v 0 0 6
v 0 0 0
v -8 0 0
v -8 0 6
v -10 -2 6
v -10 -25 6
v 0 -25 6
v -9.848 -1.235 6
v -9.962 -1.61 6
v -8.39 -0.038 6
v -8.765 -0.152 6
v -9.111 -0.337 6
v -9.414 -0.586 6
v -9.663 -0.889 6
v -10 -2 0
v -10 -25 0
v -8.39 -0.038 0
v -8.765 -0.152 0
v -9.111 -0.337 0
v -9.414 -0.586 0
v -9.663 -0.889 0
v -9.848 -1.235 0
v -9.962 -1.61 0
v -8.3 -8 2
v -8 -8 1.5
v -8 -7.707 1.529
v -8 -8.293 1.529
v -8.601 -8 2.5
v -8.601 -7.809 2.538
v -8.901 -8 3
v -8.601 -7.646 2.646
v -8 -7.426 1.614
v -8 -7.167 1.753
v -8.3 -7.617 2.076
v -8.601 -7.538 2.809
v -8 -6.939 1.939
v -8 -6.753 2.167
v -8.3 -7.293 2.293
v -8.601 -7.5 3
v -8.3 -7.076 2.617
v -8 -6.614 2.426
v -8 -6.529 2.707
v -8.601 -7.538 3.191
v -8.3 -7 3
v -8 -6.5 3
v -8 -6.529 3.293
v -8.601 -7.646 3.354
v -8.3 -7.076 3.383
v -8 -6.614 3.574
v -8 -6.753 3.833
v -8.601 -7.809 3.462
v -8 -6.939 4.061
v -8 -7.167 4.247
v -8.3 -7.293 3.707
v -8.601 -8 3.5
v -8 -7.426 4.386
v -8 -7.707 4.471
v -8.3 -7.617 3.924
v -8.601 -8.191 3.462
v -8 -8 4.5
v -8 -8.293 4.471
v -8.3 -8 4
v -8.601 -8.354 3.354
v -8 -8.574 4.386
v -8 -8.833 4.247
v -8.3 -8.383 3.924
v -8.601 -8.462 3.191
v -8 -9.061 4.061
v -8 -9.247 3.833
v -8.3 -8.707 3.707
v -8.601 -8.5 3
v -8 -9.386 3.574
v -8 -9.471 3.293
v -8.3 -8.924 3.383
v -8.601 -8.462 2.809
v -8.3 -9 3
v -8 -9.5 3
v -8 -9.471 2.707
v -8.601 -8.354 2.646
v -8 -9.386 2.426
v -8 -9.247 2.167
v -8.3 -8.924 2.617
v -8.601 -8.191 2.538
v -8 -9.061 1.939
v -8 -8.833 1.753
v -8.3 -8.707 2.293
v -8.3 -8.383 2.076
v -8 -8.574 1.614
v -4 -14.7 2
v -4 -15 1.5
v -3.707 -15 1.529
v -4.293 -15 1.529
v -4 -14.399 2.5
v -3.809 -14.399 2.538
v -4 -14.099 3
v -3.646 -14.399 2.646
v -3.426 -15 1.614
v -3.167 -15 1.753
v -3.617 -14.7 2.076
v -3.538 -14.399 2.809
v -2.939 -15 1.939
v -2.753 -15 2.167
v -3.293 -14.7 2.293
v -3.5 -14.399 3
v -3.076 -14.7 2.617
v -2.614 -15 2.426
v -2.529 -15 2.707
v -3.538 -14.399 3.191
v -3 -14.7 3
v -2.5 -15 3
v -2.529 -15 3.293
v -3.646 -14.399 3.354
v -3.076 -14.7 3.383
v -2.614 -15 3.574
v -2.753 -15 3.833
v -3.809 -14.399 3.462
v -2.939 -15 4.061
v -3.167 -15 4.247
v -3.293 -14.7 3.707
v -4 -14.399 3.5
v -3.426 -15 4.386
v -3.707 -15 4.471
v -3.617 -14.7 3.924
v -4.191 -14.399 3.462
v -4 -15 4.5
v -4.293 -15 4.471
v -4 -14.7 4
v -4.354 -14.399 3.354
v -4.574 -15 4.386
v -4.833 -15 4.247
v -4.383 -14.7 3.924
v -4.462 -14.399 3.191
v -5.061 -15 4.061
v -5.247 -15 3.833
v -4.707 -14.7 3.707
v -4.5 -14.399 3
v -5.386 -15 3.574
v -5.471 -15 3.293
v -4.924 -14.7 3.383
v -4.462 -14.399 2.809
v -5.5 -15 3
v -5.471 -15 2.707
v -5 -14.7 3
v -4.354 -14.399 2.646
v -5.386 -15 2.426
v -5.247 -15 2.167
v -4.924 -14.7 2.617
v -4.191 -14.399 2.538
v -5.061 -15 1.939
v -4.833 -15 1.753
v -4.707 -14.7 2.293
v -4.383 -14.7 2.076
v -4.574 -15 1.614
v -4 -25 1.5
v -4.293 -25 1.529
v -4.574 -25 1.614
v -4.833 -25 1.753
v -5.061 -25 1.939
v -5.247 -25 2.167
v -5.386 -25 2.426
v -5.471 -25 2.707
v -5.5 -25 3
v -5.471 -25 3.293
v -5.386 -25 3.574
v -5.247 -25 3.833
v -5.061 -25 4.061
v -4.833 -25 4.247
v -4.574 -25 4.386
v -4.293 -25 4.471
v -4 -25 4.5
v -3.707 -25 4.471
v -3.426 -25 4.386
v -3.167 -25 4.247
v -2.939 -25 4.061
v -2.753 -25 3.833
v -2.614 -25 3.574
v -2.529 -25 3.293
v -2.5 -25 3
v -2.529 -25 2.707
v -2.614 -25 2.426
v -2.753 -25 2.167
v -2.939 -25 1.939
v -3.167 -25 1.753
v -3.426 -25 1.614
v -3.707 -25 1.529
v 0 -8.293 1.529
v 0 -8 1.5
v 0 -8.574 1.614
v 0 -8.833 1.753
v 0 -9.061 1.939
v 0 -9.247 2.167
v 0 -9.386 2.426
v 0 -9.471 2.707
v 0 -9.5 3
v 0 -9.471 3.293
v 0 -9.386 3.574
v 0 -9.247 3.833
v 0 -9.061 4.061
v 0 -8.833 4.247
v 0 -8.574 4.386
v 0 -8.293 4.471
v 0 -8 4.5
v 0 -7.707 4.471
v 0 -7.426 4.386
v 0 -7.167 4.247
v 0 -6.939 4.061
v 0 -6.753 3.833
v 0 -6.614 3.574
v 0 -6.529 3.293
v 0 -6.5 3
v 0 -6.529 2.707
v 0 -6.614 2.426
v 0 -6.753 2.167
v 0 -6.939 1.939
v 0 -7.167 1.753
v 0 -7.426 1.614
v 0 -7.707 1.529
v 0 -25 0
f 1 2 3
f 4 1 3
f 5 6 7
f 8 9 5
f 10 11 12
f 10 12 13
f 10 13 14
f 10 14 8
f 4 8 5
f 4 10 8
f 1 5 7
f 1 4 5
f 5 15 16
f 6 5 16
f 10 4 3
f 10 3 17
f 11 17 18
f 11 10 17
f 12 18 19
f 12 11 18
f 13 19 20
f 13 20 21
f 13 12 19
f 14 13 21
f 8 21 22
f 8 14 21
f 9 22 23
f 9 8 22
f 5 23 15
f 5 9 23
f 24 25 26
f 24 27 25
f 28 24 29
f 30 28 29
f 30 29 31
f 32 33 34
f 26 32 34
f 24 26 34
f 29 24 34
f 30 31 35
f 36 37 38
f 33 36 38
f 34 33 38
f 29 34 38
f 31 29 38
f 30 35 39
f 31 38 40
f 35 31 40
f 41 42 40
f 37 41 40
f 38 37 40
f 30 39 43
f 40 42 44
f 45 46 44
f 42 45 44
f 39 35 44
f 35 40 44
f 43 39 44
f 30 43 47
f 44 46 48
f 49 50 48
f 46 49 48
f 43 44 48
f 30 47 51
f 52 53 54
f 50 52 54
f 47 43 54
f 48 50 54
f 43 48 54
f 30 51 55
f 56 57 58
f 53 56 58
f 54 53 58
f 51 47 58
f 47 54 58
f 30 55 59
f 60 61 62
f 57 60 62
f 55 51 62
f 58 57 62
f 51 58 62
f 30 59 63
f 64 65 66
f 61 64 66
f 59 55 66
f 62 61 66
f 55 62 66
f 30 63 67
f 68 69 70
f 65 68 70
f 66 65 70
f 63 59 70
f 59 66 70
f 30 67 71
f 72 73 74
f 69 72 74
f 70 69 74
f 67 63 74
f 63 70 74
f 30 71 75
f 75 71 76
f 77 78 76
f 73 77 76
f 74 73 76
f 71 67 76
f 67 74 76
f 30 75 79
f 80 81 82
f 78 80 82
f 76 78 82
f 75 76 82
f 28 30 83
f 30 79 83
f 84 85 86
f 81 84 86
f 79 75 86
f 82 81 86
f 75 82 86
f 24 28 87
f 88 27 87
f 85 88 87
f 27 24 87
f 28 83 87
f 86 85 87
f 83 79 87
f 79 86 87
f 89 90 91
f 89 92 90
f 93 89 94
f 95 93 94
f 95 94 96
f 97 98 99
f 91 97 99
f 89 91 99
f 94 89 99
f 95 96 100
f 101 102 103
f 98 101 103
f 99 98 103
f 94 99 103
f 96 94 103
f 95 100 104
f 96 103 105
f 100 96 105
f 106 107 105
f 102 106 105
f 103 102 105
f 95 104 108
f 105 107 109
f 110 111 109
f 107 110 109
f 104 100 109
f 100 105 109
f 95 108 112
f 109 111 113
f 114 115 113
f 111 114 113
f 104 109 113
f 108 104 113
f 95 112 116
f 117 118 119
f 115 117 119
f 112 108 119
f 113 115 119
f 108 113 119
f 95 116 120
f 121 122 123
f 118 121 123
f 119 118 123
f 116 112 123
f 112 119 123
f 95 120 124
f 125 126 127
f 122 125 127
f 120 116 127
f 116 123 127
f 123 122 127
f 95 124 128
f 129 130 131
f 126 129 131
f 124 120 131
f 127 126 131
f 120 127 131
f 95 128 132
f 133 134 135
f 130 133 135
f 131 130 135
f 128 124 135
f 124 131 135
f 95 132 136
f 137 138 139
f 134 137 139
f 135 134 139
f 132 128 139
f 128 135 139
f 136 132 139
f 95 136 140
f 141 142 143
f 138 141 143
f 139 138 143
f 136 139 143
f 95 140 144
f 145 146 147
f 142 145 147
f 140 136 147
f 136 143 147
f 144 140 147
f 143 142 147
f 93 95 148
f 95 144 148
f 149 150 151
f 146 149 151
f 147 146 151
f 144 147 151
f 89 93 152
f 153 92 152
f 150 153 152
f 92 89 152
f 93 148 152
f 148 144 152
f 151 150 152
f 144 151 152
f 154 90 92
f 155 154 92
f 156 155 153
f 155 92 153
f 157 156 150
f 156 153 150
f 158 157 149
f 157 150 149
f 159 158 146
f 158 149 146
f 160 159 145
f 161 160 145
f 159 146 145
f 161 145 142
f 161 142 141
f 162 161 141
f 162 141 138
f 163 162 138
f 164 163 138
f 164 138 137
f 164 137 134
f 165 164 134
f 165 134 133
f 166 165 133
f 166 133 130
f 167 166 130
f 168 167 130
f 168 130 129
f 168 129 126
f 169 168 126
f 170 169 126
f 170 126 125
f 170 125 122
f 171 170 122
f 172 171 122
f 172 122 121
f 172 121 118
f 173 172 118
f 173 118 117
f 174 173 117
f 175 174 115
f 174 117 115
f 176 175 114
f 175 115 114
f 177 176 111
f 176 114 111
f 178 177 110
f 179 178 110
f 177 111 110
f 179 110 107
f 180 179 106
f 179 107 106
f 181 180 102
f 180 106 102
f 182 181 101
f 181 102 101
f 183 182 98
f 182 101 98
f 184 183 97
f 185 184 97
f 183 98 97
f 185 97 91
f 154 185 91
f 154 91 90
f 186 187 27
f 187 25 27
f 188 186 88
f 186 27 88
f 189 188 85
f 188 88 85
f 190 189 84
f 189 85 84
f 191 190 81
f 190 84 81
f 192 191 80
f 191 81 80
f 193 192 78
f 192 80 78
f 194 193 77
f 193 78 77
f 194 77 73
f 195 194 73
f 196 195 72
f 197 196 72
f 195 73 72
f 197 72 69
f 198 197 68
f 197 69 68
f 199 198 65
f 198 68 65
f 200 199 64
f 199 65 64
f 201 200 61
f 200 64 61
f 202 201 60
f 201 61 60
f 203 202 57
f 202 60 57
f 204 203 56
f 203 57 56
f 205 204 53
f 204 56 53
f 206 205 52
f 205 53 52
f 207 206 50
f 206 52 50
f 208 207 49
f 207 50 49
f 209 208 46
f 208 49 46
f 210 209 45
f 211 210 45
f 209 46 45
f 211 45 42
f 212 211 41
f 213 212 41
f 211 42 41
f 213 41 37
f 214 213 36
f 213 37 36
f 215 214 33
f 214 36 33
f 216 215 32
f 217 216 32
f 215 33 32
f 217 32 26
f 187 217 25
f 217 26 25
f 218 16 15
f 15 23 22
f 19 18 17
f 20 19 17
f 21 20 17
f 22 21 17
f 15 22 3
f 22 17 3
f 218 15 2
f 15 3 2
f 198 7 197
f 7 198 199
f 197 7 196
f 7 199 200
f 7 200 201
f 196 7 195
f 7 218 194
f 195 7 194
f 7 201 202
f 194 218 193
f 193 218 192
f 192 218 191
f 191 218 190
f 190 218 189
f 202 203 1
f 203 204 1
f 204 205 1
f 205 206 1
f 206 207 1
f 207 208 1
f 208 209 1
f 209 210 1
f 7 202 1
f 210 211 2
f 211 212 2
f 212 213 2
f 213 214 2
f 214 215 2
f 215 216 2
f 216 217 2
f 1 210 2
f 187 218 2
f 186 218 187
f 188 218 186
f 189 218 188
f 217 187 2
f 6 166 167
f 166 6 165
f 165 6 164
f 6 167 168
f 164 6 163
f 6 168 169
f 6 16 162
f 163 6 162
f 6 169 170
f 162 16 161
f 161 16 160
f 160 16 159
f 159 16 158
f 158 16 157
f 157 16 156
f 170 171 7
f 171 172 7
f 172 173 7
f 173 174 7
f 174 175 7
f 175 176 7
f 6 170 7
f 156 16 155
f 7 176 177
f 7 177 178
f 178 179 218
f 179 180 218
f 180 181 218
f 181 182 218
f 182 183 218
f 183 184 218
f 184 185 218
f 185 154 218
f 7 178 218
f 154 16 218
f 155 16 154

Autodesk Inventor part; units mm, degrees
ref_plane "YZ Plane" through (0, 0, 0) normal (1, 0, 0) x (0, 1, 0)
ref_plane "XZ Plane" through (0, 0, 0) normal (0, 1, 0) x (-1, 0, 0)
ref_plane "XY Plane" through (0, 0, 0) normal (0, 0, 1) x (1, 0, 0)
sketch "Skizze3" plane through (0, 0, 0) normal (0, 0, 1) x (1, 0, 0)
  line L0 (0, 0) -> (-10, 0)
  line L1 (-10, 0) -> (-10, -25)
  line L2 (-10, -25) -> (0, -25)
  line L3 (0, -25) -> (0, 0)
  dimension "d4" = 10
  dimension "d5" = 25
extrude "Extrusion3" add sketch "Skizze3" along normal blind 6
sketch "Skizze4" plane through (-10, -25, 0) normal (0, -1, 0) x (1, 0, 0)
  line L0 (10, 0) -> (10, 6) projected
  line L1 (0, 0) -> (0, 6) projected
  point P0 (6, 3)
  point P1 (0, 3)
  dimension "d8" = 4
hole "Bohrung1" at (-4, -25, 3) direction (0, 1, 0) diameter 3 depth 10 tip angle 118
thread "Gewinde1" size "M3x0.5" class "6H" standard "ISO Metric profile" length 8
sketch "Skizze5" plane through (0, -25, 0) normal (1, 0, 0) x (0, 0, -1)
  line L0 (0, 25) -> (-6, 25) projected
  line L1 (0, 0) -> (-6, 0) projected
  point P0 (-3, 17)
  point P1 (-3, 25)
  dimension "d18" = 17
hole "Bohrung2" at (0, -8, 3) direction (-1, 0, 0) diameter 3 depth 8 tip angle 118
thread "Gewinde2" size "M3x0.5" class "6H" standard "ISO Metric profile" length 6
fillet "Rundung1" radius 2 1 edges at (-10, 0, 3)
properties part number "getriebe_winkel" material "Acryl"
